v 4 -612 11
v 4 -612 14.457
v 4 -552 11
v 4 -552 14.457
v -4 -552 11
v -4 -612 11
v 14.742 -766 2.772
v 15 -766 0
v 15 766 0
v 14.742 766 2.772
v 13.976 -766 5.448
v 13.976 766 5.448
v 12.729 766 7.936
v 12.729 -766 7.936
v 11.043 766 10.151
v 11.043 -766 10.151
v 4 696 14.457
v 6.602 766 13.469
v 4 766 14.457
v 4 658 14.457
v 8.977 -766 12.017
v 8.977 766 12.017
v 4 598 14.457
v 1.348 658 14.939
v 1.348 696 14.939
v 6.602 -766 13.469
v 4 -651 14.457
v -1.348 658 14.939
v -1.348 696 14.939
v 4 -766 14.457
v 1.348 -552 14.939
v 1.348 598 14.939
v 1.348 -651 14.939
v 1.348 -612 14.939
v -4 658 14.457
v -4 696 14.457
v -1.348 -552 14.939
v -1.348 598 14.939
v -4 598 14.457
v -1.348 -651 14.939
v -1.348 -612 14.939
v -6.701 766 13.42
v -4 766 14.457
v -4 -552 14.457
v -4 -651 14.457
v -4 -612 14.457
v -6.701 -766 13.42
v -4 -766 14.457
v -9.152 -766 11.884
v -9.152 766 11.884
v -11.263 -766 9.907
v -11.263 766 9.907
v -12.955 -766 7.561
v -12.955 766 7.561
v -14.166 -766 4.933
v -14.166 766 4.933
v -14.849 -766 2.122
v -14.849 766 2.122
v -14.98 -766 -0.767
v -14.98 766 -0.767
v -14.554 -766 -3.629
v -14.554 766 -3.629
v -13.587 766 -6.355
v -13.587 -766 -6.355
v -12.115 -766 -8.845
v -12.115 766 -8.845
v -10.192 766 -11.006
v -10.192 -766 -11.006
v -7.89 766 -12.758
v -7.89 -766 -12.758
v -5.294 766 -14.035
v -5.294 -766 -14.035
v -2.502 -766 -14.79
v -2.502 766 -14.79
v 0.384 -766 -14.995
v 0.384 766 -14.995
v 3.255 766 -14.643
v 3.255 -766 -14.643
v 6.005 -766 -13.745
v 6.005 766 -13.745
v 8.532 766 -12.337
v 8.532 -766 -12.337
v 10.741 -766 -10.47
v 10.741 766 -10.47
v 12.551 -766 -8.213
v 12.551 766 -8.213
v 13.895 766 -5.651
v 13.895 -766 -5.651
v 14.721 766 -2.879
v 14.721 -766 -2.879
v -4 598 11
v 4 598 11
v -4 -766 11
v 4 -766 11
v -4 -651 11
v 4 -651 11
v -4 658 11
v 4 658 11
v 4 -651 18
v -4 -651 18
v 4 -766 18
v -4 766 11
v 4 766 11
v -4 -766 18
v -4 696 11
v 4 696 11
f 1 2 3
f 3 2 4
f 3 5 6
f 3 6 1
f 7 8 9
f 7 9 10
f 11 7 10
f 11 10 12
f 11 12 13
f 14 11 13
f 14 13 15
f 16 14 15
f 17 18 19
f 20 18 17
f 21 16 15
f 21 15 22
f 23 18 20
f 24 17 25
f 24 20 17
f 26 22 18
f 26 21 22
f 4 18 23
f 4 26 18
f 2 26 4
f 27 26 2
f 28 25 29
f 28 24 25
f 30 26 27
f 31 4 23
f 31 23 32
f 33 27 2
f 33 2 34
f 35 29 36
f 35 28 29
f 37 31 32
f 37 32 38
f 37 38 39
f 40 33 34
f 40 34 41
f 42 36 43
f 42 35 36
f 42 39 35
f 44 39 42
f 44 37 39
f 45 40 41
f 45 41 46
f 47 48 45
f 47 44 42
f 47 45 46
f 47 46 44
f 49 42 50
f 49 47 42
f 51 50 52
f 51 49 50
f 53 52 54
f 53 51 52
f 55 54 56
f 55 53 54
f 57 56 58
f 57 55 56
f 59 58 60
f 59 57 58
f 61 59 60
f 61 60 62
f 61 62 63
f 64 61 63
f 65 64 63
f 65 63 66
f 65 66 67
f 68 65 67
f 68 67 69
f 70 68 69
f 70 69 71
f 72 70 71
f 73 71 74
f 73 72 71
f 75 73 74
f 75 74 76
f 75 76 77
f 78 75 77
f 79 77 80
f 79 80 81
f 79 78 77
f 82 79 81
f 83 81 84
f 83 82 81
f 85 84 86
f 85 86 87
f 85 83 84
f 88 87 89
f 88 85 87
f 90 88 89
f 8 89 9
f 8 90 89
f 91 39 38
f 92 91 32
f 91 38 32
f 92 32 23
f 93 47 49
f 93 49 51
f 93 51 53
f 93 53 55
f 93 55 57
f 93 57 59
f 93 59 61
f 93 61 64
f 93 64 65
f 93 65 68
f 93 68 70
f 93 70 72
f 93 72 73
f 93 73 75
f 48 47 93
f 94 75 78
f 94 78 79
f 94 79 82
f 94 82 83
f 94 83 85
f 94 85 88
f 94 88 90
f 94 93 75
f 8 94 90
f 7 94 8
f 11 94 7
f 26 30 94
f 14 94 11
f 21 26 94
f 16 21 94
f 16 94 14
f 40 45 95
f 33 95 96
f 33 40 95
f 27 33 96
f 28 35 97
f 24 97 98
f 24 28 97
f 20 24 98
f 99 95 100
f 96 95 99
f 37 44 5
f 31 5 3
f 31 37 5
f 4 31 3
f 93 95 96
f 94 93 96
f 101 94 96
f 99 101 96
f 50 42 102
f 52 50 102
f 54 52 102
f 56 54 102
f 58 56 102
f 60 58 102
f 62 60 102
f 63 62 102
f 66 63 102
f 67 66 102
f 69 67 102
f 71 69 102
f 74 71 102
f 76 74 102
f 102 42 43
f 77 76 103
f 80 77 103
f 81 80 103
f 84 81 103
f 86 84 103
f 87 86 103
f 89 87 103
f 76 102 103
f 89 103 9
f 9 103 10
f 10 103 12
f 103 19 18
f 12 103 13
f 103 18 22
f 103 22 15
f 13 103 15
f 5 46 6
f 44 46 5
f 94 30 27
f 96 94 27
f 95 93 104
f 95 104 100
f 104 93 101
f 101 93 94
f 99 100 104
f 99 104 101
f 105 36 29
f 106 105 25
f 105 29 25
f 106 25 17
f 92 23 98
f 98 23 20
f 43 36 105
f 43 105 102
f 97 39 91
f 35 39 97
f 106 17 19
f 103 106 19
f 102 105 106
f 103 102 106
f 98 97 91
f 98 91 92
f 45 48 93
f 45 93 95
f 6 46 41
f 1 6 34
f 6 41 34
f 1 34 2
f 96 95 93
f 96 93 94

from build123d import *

# Parameters (mm, degrees)
F0_R     = 15
F1_DEPTH = 766
F3_W     = 8
F3_H     = 70
F3_H_2   = 60
F3_H_3   = 115
F4_DEPTH = 4
F5_DEPTH = 7


with BuildPart() as f1:
    # F0 (on Front) → F1 (new body, symmetric)
    with BuildSketch(Plane.XZ):
        Circle(F0_R)
    extrude(amount=F1_DEPTH, both=True)

    # F3 (on offset) → F4 (cut)
    with BuildSketch(Plane.XY.offset(15)):
        with Locations((0, 731)):
            Rectangle(F3_W, F3_H)
        with Locations((0, -582)):
            Rectangle(F3_W, F3_H_2)
        with Locations((0, -708.5)):
            Rectangle(F3_W, F3_H_3)
        with Locations((0, 628)):
            Rectangle(F3_W, F3_H_2)
    extrude(amount=-F4_DEPTH, mode=Mode.SUBTRACT)


with BuildPart() as f5:
    # F5 (new): a face of the model
    f5_faces = [f1.part.faces().sort_by_distance(p)[0] for p in [
        (0, -708.5, 11),
    ]]
    extrude(f5_faces, amount=F5_DEPTH)


solid = Compound([f1.part, f5.part])
